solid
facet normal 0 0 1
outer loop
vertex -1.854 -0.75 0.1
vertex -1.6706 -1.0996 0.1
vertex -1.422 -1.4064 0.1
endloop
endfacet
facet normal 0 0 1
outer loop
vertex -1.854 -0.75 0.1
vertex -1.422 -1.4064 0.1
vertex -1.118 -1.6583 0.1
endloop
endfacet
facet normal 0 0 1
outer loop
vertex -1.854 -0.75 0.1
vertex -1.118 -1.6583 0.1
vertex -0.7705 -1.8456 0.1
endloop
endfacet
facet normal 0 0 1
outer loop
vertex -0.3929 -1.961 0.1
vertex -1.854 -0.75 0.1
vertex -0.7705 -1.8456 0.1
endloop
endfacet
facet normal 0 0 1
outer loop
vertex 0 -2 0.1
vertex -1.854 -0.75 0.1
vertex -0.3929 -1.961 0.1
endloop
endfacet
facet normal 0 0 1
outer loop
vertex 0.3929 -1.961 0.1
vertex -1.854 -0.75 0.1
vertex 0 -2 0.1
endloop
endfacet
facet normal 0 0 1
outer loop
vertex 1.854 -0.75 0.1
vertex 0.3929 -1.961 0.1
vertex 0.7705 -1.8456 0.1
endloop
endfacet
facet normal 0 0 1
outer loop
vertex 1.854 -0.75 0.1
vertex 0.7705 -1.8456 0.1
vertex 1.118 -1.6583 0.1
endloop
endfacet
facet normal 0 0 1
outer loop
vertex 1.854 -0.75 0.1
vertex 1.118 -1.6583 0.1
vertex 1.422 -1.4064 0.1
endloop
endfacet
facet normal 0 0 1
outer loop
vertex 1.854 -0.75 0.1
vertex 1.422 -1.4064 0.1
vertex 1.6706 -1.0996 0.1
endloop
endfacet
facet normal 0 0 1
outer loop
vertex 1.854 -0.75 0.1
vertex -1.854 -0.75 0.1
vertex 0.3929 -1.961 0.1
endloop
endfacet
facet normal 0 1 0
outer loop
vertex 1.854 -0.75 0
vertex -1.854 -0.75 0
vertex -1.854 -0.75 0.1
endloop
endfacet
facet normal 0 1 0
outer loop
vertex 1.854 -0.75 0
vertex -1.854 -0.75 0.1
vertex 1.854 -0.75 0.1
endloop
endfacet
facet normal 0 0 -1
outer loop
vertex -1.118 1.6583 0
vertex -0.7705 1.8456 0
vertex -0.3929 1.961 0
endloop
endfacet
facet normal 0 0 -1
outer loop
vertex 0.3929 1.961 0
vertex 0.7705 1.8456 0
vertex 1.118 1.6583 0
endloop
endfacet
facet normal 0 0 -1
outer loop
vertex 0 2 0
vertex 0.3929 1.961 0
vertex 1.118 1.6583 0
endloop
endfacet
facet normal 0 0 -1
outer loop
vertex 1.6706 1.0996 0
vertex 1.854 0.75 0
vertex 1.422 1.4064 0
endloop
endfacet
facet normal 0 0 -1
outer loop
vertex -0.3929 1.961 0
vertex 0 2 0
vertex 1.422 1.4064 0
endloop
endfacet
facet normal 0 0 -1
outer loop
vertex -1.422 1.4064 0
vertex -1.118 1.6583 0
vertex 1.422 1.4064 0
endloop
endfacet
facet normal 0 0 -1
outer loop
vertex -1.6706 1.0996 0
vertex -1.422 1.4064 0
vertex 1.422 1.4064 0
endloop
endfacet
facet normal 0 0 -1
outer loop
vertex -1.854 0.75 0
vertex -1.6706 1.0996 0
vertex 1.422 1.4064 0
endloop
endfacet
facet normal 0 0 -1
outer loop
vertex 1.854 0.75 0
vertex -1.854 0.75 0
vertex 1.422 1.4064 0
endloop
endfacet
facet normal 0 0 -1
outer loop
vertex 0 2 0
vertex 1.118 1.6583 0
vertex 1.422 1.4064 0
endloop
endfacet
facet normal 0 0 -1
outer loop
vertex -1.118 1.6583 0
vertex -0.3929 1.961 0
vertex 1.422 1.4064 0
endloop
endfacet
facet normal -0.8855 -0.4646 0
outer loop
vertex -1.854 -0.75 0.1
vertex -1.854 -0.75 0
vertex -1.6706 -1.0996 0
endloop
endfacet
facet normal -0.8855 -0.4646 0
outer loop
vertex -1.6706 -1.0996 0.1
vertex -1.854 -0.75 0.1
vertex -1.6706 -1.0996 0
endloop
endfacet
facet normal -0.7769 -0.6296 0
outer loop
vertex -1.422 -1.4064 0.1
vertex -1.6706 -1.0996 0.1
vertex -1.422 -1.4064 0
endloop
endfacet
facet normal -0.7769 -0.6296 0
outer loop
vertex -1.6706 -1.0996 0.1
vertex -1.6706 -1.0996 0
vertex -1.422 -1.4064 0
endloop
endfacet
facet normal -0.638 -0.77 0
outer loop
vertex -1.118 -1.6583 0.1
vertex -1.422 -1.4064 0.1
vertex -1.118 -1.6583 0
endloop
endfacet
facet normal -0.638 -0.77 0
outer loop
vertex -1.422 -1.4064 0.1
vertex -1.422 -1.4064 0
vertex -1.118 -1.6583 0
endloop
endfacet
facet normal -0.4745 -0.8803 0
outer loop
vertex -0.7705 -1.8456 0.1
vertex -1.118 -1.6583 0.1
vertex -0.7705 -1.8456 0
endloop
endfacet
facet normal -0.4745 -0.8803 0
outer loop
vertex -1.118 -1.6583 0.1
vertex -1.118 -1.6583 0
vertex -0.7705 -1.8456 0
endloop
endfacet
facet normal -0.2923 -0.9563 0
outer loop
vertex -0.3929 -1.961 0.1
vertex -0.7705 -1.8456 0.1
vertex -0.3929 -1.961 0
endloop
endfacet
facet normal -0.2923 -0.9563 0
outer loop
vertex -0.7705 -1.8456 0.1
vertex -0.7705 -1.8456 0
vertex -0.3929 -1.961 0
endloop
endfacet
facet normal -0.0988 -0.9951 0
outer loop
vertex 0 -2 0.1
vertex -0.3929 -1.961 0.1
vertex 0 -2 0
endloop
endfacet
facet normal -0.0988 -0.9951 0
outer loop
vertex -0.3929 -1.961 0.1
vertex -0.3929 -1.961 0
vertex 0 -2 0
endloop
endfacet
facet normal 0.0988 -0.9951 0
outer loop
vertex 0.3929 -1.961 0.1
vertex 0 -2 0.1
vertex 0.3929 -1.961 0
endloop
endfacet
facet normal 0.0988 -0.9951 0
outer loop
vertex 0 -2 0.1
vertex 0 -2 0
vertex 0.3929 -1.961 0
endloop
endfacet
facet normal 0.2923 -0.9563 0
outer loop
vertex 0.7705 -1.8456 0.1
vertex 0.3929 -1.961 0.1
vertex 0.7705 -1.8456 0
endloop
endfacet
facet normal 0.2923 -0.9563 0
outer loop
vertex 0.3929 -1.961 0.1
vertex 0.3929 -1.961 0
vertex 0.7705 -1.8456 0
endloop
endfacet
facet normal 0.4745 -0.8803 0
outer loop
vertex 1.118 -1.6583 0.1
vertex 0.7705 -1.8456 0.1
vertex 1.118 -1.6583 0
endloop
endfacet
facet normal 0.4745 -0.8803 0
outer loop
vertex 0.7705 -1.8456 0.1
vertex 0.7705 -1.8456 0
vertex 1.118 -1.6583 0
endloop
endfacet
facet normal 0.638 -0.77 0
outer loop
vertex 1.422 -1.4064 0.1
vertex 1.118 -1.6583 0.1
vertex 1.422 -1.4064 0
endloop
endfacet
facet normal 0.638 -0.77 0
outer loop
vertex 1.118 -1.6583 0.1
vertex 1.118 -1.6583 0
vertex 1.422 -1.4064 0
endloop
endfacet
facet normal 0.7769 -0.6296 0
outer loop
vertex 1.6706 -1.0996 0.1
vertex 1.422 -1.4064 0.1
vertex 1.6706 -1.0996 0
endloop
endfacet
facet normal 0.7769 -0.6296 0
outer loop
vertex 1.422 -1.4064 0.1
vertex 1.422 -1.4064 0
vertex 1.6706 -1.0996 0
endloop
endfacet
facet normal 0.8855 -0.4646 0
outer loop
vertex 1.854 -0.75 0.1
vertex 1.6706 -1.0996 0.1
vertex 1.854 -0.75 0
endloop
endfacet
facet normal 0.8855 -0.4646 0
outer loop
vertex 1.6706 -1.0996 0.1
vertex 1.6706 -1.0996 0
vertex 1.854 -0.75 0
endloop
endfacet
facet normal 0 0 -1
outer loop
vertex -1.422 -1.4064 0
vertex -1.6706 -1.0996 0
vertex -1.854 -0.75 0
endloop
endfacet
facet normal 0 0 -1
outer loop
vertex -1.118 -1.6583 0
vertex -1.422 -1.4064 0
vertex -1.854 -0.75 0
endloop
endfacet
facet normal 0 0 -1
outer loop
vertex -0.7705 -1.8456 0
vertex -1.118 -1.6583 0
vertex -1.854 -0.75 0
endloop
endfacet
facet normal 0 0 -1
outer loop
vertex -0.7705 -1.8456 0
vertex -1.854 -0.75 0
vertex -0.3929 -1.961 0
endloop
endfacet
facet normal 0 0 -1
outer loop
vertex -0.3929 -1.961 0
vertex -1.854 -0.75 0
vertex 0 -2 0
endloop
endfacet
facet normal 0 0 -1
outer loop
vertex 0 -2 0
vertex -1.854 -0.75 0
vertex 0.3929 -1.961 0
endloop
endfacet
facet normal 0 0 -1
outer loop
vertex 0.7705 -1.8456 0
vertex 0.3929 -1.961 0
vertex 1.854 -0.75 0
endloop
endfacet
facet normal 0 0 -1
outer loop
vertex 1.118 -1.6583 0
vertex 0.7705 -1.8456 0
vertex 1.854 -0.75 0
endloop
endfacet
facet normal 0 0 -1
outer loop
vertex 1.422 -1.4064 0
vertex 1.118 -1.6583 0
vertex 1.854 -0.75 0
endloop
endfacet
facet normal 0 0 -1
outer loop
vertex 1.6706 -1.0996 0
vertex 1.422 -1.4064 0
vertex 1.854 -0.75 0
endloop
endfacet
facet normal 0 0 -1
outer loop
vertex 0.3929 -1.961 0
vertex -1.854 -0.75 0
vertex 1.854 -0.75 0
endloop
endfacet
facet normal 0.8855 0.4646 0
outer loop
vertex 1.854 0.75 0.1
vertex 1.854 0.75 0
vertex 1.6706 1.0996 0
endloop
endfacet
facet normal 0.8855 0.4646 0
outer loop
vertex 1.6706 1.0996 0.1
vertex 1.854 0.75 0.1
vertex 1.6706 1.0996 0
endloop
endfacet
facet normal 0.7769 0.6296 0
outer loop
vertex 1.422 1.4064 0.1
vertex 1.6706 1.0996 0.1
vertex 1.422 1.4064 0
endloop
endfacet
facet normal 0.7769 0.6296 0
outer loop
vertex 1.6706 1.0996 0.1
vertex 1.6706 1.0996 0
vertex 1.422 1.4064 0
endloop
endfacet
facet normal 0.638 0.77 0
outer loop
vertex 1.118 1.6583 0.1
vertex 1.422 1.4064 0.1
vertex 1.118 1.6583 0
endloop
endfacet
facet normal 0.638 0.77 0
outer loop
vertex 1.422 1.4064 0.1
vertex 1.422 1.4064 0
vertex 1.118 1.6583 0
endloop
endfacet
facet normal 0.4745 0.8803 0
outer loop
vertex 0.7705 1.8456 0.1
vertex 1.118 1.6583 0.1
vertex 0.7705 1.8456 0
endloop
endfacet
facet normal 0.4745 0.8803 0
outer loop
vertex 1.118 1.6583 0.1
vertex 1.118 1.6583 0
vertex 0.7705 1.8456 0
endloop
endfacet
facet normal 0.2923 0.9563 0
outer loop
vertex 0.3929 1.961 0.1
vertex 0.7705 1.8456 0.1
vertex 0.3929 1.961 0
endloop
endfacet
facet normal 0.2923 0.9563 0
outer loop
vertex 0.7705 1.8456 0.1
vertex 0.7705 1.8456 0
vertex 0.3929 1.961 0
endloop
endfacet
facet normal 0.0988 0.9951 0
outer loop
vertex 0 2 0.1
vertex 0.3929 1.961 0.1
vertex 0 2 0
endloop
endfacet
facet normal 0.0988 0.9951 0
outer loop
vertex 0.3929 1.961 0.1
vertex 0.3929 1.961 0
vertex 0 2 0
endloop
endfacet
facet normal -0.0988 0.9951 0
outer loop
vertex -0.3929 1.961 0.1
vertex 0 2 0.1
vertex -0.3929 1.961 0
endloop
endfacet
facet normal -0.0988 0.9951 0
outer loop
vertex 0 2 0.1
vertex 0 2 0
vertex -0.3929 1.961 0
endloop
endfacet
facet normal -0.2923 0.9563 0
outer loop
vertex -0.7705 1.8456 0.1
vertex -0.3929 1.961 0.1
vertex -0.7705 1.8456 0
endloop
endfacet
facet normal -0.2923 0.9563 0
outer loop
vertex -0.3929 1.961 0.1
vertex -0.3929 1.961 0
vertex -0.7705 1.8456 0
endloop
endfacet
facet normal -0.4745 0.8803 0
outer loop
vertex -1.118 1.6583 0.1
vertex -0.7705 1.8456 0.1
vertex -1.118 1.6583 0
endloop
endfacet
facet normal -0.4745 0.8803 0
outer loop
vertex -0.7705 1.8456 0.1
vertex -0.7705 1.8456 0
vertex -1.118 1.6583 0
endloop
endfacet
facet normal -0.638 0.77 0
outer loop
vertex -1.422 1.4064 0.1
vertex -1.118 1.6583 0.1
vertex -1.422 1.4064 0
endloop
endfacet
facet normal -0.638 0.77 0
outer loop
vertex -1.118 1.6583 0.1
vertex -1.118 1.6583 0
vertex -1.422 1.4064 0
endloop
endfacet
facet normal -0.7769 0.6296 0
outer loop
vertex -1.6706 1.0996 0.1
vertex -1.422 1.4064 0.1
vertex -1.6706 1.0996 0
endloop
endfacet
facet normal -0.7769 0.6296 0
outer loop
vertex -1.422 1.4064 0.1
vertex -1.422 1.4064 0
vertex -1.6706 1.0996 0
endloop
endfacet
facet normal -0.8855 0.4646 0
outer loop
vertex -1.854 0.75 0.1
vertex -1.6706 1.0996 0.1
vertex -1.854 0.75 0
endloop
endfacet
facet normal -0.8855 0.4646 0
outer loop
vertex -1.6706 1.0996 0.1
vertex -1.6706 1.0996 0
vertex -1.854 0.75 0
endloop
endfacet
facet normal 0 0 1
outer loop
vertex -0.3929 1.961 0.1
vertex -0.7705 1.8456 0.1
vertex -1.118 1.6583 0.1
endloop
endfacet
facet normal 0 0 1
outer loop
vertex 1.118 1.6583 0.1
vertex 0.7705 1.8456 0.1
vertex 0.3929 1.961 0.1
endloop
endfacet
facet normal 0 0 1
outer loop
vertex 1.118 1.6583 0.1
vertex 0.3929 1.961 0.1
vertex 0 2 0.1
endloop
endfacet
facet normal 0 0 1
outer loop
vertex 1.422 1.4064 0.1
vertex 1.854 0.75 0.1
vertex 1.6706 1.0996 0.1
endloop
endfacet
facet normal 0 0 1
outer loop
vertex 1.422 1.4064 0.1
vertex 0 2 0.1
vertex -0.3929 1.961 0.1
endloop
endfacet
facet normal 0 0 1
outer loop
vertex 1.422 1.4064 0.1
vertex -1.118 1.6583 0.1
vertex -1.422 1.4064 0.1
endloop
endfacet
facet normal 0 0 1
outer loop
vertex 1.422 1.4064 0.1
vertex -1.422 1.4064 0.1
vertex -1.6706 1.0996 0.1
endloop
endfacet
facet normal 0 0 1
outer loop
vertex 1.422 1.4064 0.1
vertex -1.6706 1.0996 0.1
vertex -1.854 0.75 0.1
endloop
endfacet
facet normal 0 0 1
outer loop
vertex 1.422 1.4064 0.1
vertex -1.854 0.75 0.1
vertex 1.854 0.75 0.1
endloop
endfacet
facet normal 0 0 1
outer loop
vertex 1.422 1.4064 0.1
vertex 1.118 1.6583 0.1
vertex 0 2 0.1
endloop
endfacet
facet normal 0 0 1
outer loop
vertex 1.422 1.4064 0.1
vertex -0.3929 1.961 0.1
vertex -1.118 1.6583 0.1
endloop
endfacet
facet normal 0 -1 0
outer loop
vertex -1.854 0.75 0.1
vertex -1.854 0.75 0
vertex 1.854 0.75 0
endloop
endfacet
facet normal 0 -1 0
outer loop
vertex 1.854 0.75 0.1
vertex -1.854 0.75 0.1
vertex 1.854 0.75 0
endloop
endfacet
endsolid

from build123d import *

# Parameters (mm, degrees)
CYLINDER_R     = 2
CYLINDER_DEPTH = 0.1
SKETCH_W       = 4.5
SKETCH_H       = 1.75
PAD_DEPTH      = 0.1


with BuildPart() as cylinder:
    # Cylinder → Cylinder (new body)
    with BuildSketch(Plane.XY):
        Circle(CYLINDER_R)
    extrude(amount=CYLINDER_DEPTH)


with BuildPart() as common:
    # Sketch → Pad (new body)
    with BuildSketch(Plane.XY):
        with Locations((0, 1.625)):
            Rectangle(SKETCH_W, SKETCH_H)
        with Locations((0, -1.625)):
            Rectangle(SKETCH_W, SKETCH_H)
    extrude(amount=PAD_DEPTH)

    # Common: intersect Cylinder
    add(cylinder.part, mode=Mode.INTERSECT)


solid = common.part
